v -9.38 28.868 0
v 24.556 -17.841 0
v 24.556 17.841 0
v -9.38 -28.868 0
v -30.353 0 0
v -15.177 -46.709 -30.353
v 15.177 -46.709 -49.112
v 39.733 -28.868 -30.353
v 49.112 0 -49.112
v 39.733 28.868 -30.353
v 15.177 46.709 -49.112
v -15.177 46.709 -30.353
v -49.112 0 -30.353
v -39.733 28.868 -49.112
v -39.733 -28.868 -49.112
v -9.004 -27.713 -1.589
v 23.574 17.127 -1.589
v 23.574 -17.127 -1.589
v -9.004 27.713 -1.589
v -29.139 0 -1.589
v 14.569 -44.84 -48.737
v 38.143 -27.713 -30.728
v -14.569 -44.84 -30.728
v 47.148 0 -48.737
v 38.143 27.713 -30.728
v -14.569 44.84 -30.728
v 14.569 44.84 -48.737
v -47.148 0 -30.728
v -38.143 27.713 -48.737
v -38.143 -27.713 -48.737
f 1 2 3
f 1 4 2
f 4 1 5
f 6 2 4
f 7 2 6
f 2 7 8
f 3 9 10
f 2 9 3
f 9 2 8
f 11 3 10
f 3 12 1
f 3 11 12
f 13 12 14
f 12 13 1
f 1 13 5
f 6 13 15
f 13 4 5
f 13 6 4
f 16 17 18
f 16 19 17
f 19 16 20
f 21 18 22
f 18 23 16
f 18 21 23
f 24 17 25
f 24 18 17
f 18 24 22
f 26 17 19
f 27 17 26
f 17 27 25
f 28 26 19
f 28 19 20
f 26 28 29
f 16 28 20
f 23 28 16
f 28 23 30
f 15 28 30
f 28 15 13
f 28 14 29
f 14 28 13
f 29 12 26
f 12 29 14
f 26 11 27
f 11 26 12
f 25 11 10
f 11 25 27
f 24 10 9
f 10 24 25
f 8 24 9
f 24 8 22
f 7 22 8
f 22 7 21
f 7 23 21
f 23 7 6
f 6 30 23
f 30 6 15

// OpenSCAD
rad = 50;
wall_thickness = 2;
r_outer = rad / sqrt(3);
r_inner = (rad - wall_thickness) / sqrt(3);
angle = 31.717474411;

phi = 1 / 2 + sqrt(5 / 4);

wall_p = [[-1,-1,-1] * r_outer,  
[-1,-1,1] * r_outer, 
[-1,1,-1] * r_outer, 
[-1,1,1] * r_outer, 
[1,-1,-1] * r_outer, 
[1,-1,1] * r_outer, 
[1,1,-1] * r_outer, 
[1,1,1] * r_outer,
[0,           1/phi,   phi] * r_outer, 
[0,          -1/phi,   phi] * r_outer,
[0,          1/phi,   -phi] * r_outer, 
[0,          -1/phi, -phi] * r_outer,
[1/phi,   phi,     0] * r_outer,
[-1/phi, phi,    0] * r_outer,
[1/phi,   -phi,  0] * r_outer,
[-1/phi, -phi,  0] * r_outer,
[phi,       0,      1/phi] * r_outer,
[-phi,     0,      1/phi] * r_outer,
[phi,       0,      -1/phi] * r_outer,
[-phi,     0,      -1/phi] * r_outer];

wall_p2 = [[-1,-1,-1] * r_inner,  
[-1,-1,1] * r_inner, 
[-1,1,-1] * r_inner, 
[-1,1,1] * r_inner, 
[1,-1,-1] * r_inner, 
[1,-1,1] * r_inner, 
[1,1,-1] * r_inner, 
[1,1,1] * r_inner,
[0,           1/phi,   phi] * r_inner, 
[0,          -1/phi,   phi] * r_inner,
[0,          1/phi,   -phi] * r_inner, 
[0,          -1/phi, -phi] * r_inner,
[1/phi,   phi,     0] * r_inner,
[-1/phi, phi,    0] * r_inner,
[1/phi,   -phi,  0] * r_inner,
[-1/phi, -phi,  0] * r_inner,
[phi,       0,      1/phi] * r_inner,
[-phi,     0,      1/phi] * r_inner,
[phi,       0,      -1/phi] * r_inner,
[-phi,     0,      -1/phi] * r_inner];

wall_f = [[8,9,1,17,3],[9,5,14,15,1],[9,8,7,16,5],[8,3,13,12,7],[3,17,19,2,13],[17,1,15,0,19]];
wall_f2 = [[3+20,17+20,1+20,9+20,8 + 20],
[1 + 20,15 + 20,14 + 20,5 + 20,9 + 20],
[5 + 20,16 + 20,7 + 20,8 + 20,9 + 20],
[7 + 20,12 + 20,13 + 20,3 + 20,8 + 20],
[13 + 20,2 + 20,19 + 20,17 + 20,3 + 20],
[19 + 20,0 + 20,15 + 20,1 + 20,17 + 20]];

wall_f3 = [[19,0,0+20,19+20],[2,19,19+20,2+20], [13,2,2+20,13+20],[12,13,13+20,12+20],[7,12,12+20,7+20],[16,7,7+20,16+20],[5,16,16+20,5+20],[14,5,5+20,14+20],[15,14,14+20,15+20],[0,15,15+20,0+20]];

battery_p = [[cos(angle), sin(angle)]];



translate([0,0,-2.7527638409422998/2] * r_outer) {
    rotate([0,angle,0]) {
        polyhedron(points = concat(wall_p, wall_p2), faces = concat(wall_f, wall_f2, wall_f3), convexivity = 4);
    }
}
